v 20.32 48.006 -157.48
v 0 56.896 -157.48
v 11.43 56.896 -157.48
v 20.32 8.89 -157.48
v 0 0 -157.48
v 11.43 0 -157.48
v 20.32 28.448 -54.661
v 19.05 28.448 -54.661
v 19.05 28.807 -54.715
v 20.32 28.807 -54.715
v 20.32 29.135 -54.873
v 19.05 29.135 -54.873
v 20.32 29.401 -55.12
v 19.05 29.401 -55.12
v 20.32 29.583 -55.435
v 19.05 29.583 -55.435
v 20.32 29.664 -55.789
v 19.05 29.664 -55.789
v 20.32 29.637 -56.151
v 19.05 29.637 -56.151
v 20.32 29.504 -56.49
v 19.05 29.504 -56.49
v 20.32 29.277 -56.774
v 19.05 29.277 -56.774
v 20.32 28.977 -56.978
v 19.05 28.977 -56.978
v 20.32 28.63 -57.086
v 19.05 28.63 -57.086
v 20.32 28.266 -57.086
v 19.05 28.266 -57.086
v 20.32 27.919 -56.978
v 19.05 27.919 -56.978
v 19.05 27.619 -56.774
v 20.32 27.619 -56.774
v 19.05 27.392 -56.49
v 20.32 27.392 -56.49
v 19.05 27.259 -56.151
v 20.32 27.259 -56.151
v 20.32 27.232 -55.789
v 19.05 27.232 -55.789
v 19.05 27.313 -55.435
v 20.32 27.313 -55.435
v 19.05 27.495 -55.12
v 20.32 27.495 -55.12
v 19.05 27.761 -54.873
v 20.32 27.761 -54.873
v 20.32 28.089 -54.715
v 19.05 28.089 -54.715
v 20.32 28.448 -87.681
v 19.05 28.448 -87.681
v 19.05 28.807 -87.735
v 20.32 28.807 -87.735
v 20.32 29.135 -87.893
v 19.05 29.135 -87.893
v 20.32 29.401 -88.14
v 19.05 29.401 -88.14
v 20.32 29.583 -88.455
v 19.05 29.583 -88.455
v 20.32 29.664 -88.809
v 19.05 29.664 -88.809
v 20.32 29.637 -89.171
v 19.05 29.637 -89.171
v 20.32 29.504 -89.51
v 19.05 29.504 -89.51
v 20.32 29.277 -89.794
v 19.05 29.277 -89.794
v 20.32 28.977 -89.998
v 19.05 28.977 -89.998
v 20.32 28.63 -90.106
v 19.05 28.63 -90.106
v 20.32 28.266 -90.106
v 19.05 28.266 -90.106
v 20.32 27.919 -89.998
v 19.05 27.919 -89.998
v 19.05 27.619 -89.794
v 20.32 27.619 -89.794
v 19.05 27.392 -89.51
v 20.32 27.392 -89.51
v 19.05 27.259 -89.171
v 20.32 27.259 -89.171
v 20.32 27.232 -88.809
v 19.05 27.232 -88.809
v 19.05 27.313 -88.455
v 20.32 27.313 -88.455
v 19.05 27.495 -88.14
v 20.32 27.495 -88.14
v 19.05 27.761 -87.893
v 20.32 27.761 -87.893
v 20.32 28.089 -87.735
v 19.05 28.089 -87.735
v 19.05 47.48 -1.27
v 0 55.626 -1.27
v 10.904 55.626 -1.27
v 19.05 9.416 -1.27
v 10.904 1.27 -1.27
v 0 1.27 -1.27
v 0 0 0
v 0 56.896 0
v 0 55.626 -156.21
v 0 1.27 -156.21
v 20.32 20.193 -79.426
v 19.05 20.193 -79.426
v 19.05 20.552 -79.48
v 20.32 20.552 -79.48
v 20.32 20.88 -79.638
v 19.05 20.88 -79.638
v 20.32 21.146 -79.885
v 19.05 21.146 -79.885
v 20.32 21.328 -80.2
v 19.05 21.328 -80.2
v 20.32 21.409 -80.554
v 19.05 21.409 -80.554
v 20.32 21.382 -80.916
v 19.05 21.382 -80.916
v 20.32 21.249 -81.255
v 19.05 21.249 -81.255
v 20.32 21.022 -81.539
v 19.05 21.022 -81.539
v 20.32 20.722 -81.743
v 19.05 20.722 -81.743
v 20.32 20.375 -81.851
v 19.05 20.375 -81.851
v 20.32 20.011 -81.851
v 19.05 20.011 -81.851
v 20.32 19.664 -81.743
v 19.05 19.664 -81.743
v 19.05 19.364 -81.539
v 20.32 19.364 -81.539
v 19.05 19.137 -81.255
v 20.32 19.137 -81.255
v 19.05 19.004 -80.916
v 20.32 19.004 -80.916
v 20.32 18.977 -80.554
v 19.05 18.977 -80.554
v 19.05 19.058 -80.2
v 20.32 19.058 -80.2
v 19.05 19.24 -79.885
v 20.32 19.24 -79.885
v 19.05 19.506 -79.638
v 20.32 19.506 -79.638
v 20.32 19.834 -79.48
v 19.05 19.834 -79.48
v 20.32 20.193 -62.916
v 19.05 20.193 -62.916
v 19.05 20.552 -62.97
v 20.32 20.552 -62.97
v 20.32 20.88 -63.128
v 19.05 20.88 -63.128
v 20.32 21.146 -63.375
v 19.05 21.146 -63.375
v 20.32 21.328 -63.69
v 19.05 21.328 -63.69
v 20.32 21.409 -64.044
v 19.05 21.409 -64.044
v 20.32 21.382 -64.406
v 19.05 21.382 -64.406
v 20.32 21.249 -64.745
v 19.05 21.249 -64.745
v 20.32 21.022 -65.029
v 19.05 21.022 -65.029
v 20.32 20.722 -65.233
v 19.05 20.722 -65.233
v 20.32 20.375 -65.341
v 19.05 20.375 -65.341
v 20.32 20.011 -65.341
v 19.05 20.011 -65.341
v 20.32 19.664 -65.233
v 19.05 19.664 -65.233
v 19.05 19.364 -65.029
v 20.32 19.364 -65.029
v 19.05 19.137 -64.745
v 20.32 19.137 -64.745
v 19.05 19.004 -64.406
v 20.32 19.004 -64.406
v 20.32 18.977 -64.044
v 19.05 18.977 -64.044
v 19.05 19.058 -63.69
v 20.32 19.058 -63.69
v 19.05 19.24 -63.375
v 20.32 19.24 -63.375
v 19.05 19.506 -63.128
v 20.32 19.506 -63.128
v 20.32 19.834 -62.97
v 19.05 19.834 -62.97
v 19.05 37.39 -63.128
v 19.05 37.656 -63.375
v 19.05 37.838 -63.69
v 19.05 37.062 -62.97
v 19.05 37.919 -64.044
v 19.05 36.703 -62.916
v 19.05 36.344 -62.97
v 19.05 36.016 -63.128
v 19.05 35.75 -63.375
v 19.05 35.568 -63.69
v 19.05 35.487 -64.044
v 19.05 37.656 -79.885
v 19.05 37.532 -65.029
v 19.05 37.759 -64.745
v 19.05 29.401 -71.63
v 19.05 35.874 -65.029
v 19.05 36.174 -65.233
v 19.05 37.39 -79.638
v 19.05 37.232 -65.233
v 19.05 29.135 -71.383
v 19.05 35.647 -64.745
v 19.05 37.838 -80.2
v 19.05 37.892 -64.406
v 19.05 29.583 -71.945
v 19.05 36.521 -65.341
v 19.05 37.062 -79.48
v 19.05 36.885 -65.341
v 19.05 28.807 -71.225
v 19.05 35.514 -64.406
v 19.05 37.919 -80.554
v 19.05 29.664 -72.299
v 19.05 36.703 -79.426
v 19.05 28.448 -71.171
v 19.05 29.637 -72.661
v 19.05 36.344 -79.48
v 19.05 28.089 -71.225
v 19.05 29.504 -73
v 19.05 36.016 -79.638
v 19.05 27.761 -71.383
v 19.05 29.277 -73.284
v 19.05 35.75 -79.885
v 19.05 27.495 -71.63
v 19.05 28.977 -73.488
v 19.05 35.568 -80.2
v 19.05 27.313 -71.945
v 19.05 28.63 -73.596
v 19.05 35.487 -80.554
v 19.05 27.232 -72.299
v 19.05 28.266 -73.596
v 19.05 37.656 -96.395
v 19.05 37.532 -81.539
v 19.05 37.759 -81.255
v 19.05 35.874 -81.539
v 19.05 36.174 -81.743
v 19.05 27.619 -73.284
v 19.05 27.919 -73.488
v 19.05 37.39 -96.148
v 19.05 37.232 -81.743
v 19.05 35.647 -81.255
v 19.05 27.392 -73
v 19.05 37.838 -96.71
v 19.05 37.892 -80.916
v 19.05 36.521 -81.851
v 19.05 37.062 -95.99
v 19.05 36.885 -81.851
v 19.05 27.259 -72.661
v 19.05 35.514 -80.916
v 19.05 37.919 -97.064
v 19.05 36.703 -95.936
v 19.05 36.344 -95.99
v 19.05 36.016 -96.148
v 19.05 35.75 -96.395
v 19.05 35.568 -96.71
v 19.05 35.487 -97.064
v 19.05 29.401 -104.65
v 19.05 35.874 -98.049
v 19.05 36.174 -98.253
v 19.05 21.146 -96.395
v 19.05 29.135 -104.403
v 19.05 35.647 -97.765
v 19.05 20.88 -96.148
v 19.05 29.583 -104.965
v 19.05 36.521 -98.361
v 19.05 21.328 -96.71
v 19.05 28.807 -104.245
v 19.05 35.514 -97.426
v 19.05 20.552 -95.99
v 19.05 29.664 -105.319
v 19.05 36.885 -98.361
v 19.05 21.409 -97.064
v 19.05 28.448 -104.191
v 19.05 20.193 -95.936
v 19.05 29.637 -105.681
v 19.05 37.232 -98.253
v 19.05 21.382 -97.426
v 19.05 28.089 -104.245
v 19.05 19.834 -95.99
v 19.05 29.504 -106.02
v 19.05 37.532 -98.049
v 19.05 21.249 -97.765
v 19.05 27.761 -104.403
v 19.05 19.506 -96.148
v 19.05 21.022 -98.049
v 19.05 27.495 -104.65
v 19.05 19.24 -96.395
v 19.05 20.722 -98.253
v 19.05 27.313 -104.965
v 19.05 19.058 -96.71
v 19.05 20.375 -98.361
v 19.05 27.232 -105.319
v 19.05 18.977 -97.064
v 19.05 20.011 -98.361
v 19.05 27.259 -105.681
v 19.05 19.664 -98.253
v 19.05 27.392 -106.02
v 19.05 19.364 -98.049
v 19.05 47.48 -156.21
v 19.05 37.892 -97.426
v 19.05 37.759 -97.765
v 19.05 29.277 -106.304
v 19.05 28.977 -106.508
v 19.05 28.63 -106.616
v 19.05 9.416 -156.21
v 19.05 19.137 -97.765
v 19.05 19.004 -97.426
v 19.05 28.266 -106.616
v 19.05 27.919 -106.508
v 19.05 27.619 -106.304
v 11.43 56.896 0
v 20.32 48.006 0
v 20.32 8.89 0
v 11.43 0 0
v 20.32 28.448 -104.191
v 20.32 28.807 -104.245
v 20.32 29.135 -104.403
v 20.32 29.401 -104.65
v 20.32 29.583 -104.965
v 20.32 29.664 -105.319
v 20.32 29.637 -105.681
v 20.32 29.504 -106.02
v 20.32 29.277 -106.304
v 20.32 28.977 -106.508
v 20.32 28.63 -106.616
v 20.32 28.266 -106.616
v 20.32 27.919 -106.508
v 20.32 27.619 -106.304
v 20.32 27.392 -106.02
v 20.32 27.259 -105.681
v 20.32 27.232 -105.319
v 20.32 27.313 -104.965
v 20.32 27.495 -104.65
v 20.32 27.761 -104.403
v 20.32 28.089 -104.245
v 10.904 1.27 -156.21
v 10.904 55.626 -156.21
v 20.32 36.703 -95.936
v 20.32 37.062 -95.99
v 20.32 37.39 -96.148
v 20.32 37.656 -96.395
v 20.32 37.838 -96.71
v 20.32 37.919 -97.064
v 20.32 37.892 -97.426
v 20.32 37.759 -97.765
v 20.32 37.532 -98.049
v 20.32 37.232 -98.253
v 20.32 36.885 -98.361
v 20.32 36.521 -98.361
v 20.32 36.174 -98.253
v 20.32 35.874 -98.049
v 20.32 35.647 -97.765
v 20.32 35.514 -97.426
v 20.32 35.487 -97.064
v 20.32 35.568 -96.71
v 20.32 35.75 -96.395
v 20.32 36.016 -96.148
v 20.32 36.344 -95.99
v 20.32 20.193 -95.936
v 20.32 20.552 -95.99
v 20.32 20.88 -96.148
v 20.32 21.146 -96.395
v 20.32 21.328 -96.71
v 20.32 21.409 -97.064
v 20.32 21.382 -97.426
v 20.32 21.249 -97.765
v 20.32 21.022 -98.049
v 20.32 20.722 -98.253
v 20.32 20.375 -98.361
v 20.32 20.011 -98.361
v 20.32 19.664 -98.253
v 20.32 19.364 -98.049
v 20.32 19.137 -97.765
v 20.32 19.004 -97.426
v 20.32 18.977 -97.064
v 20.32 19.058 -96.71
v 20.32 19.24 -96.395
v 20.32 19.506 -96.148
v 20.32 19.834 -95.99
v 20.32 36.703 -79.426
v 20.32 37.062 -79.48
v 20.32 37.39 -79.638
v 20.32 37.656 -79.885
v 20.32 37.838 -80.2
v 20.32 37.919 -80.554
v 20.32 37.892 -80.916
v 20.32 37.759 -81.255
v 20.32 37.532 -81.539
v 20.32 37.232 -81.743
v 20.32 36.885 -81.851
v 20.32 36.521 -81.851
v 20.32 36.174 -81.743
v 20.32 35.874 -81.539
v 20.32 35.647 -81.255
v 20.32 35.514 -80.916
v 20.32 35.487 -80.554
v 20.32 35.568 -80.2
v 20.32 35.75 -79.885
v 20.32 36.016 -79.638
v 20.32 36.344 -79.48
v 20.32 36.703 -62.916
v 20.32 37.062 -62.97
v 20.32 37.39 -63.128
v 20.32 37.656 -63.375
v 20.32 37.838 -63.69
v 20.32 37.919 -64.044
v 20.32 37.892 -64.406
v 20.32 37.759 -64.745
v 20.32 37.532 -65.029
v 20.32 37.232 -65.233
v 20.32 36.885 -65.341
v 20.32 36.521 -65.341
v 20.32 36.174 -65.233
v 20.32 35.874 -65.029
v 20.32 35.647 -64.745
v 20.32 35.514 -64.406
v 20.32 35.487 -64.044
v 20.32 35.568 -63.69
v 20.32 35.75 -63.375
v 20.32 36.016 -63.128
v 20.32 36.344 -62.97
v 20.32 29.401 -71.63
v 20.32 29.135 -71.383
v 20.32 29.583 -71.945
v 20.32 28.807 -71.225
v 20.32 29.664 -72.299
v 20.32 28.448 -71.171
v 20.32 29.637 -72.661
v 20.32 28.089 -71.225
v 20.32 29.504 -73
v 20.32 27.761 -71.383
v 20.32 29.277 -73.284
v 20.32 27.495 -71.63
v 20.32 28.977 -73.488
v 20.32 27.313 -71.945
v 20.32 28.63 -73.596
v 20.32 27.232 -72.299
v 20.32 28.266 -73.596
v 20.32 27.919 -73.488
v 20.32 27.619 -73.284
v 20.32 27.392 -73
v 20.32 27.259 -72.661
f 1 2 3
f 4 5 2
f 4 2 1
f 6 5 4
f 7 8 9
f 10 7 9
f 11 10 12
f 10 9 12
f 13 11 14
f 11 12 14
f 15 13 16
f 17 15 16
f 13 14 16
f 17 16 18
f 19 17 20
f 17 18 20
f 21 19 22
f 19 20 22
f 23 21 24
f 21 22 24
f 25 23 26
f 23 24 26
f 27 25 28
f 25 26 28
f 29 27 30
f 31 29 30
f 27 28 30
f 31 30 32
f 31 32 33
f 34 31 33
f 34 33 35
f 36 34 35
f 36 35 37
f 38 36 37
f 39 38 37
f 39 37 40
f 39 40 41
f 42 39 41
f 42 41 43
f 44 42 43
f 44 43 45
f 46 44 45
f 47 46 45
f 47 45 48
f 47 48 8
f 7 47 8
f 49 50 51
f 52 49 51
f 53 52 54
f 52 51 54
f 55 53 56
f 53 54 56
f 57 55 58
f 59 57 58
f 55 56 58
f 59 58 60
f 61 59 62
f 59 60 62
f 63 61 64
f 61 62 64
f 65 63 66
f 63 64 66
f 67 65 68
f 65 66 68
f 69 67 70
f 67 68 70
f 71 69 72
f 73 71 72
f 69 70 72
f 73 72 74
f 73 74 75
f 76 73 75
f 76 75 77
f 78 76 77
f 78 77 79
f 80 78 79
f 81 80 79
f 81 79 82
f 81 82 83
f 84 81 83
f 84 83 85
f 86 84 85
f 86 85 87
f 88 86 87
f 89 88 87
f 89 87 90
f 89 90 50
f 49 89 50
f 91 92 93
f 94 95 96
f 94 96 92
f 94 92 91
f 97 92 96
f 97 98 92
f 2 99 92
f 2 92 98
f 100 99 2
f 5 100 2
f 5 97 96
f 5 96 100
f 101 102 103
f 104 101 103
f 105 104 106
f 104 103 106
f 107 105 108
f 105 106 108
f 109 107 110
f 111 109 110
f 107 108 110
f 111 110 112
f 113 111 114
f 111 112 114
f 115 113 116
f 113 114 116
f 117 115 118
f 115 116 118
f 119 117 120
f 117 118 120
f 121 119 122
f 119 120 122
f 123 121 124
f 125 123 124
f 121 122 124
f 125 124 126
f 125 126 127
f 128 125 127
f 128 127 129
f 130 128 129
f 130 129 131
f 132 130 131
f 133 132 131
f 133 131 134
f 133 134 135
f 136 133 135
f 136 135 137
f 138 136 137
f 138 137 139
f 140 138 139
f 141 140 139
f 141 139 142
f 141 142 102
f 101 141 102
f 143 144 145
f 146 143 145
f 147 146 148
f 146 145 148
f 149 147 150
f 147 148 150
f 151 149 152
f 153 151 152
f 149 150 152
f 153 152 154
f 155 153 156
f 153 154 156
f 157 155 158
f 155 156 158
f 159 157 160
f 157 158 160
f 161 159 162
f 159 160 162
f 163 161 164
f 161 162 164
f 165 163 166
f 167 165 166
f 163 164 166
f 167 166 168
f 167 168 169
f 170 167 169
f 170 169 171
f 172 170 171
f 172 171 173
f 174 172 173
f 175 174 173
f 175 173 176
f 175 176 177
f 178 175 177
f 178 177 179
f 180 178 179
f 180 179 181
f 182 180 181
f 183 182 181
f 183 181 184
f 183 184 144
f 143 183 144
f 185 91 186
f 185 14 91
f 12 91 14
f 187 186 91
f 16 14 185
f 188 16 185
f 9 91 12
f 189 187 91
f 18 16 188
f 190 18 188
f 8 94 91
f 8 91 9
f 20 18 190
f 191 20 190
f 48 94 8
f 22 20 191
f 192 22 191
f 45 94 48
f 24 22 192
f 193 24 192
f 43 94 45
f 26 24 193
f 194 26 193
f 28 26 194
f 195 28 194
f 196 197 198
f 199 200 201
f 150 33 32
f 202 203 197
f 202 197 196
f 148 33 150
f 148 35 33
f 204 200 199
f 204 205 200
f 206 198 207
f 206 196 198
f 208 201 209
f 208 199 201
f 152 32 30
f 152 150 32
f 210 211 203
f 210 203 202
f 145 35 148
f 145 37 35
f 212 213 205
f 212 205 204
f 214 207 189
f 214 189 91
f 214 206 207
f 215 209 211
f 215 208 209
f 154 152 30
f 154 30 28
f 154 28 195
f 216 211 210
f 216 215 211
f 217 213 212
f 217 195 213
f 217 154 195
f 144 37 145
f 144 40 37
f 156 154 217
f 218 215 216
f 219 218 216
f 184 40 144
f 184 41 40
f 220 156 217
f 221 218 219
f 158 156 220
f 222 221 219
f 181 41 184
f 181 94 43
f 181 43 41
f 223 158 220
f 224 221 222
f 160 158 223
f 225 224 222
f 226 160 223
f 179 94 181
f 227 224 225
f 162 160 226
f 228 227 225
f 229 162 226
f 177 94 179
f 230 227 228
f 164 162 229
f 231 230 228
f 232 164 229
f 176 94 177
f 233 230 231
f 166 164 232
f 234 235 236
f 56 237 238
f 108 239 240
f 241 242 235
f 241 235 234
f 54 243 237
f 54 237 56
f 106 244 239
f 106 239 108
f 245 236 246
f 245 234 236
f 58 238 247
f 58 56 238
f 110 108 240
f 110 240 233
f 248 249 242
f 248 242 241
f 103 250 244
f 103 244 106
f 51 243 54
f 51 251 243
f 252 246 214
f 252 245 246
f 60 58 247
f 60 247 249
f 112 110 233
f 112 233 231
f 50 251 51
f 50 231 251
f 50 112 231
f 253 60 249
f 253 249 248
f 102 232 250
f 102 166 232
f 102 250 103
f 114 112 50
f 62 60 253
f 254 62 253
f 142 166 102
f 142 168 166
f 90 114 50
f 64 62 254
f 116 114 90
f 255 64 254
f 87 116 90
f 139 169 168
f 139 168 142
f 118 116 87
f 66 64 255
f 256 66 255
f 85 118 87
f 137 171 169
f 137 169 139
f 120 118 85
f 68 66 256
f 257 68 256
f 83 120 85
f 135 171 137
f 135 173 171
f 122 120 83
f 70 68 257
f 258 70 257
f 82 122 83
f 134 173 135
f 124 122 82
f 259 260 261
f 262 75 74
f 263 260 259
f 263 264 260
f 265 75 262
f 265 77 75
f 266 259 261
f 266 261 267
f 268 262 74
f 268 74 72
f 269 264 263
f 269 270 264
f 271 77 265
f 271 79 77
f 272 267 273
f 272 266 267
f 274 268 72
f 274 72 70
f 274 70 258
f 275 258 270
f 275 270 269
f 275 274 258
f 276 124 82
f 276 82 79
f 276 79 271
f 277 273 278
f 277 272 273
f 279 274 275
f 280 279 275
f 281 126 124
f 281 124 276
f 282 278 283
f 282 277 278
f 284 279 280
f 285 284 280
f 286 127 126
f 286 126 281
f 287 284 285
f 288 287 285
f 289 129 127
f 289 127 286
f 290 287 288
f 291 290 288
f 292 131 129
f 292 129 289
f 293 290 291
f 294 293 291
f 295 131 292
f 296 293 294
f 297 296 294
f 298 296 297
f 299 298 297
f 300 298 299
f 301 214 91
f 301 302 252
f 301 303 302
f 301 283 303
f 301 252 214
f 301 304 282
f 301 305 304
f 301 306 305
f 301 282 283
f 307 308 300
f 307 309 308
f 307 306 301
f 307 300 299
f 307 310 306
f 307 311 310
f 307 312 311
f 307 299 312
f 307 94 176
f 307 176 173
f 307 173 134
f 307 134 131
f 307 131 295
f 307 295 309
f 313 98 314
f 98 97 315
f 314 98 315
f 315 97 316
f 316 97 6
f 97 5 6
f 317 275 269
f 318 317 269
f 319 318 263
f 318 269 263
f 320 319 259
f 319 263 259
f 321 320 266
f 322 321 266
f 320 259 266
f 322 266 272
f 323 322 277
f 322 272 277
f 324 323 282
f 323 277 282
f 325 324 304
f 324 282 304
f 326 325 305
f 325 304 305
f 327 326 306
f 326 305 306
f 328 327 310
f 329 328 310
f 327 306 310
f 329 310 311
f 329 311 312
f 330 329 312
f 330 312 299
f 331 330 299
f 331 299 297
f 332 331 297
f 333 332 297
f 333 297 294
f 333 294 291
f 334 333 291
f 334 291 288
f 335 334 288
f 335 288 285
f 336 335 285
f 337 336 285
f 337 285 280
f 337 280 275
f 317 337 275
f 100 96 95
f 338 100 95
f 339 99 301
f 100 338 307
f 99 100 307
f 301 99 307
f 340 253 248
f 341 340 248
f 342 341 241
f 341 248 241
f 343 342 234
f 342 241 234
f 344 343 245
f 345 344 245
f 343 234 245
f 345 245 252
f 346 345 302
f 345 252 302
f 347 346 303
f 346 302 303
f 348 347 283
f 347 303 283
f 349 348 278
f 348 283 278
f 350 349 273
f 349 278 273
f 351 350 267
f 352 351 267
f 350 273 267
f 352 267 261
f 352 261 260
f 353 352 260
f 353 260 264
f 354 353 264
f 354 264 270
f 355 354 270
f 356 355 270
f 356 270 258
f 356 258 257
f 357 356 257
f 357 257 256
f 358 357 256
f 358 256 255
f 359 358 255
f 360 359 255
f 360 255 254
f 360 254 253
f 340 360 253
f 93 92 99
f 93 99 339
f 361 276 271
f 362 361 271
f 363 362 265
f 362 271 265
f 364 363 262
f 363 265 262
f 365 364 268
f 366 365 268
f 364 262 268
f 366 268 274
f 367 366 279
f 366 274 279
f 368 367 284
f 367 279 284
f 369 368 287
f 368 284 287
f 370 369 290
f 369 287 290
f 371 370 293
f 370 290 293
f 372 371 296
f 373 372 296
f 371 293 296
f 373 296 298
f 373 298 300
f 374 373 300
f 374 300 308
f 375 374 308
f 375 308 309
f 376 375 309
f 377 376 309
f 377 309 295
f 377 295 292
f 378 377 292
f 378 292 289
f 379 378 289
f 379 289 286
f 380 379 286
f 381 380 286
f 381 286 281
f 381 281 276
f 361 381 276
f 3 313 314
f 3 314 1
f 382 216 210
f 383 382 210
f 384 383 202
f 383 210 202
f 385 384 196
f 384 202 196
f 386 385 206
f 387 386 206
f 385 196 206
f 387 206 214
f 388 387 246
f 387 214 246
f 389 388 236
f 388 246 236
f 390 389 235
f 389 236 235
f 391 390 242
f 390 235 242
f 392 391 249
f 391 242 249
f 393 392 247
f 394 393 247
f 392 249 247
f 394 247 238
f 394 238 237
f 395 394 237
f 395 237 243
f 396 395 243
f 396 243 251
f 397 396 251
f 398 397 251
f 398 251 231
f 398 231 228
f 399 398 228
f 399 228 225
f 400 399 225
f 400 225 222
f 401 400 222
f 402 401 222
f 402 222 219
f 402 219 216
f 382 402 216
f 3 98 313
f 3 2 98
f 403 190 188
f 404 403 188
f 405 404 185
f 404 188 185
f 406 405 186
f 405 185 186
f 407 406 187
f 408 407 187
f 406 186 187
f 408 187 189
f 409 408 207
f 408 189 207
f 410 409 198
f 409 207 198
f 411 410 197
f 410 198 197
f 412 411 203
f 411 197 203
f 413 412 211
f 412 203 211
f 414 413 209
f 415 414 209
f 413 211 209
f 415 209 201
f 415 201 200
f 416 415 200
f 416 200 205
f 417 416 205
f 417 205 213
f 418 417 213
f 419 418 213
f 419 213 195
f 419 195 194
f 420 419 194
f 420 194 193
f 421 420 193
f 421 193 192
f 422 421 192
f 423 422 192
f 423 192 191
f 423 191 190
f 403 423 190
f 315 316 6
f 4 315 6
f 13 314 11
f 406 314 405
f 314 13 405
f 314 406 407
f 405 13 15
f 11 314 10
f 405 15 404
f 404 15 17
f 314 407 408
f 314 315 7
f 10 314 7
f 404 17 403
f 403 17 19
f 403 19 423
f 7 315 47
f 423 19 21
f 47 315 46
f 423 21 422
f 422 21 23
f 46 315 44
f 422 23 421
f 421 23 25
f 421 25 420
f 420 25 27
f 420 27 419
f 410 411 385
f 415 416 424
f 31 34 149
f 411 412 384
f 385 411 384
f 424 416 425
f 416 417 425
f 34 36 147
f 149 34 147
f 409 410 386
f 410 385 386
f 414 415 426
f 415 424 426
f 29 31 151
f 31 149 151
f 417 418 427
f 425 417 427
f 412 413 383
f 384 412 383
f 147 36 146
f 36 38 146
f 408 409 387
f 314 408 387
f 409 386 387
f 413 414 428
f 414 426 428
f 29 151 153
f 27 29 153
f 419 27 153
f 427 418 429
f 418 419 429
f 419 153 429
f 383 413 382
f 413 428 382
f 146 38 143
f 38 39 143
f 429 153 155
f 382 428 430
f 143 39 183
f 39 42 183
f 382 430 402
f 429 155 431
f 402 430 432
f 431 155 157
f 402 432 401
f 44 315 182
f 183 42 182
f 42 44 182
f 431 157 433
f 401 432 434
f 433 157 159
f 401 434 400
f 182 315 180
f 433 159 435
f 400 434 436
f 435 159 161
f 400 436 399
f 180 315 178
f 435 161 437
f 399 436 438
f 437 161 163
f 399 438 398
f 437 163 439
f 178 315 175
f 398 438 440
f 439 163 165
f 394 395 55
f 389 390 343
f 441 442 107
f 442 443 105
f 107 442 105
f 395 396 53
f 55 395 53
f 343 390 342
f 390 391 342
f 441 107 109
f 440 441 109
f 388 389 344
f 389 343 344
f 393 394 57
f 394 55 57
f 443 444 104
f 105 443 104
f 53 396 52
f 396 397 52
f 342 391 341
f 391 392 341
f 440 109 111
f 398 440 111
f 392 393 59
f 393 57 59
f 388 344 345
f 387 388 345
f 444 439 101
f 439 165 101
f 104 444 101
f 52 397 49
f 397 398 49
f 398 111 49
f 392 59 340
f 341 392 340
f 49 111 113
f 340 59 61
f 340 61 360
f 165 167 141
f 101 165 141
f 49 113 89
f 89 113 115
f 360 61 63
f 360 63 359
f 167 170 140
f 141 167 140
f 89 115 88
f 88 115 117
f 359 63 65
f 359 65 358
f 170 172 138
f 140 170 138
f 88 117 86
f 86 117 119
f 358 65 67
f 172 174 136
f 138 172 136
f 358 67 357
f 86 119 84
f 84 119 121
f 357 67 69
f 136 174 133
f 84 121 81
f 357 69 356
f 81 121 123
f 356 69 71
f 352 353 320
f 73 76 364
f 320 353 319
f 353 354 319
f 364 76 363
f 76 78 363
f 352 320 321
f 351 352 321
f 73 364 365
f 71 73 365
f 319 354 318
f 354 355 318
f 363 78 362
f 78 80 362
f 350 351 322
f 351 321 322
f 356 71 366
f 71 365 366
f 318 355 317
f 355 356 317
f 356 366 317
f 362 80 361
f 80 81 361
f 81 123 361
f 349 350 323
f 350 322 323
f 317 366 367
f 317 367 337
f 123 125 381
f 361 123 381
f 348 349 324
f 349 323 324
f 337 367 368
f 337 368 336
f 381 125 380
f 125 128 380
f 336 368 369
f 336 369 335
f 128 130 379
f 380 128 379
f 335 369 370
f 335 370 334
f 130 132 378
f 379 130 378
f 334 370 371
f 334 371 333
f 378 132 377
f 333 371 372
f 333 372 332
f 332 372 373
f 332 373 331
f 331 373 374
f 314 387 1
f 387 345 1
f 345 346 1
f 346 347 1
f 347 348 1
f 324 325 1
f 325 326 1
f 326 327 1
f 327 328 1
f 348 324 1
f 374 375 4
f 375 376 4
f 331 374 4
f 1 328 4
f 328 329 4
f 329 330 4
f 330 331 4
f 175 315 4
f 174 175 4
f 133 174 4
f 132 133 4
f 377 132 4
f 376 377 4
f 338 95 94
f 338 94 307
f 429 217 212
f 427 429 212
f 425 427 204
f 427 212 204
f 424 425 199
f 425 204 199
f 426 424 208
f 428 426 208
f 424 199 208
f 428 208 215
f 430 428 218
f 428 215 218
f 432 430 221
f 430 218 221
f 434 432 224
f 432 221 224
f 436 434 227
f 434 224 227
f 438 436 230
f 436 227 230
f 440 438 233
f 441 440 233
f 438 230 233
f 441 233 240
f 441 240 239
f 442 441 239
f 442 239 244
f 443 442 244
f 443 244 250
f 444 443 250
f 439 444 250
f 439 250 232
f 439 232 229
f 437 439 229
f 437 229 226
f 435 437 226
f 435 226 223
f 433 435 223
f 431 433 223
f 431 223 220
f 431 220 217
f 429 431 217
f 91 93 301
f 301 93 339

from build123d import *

# Parameters (mm, degrees)
SKETCH1_W                 = 20.32
SKETCH1_H                 = 157.48
BOSS_EXTRUDE1_DEPTH       = 56.896
CHAMFER1_SIZE             = 8.89
SHELL1_T                  = -1.27
F_2_CLEARANCE_HOLE1_D     = 2.4384
F_2_CLEARANCE_HOLE1_DEPTH = 7.62
F_2_CLEARANCE_HOLE1_TIP   = 0.732569267


with BuildPart() as part:
    # Sketch1 → Boss-Extrude1 (new body)
    with BuildSketch(Plane(origin=(0, 0, 0), x_dir=(1, 0, 0), z_dir=(0, 1, 0))):
        with Locations((10.16, 78.74)):
            Rectangle(SKETCH1_W, SKETCH1_H)
    extrude(amount=BOSS_EXTRUDE1_DEPTH)

    # Chamfer1
    chamfer1_edges = [part.edges().sort_by_distance(p)[0] for p in [
        (20.32, 56.896, -78.74),
        (20.32, 0, -78.74),
    ]]
    chamfer(chamfer1_edges, length=CHAMFER1_SIZE)

    # Shell1
    shell1_openings = [part.faces().sort_by_distance(p)[0] for p in [
        (0, 28.448, -78.74),
    ]]
    offset(amount=SHELL1_T, openings=shell1_openings, kind=Kind.INTERSECTION)

    # #2 Clearance Hole1
    with Locations(Plane(origin=(20.32, 0, 0), x_dir=(0, 0, -1), z_dir=(1, 0, 0))):
        with Locations((55.88, 28.448), (72.39, 28.448), (80.645, 36.703), (80.645, 20.193), (88.9, 28.448), (105.41, 28.448), (97.155, 36.703), (97.155, 20.193), (64.135, 36.703), (64.135, 20.193)):
            Hole(F_2_CLEARANCE_HOLE1_D / 2, depth=F_2_CLEARANCE_HOLE1_DEPTH)
            with Locations((0, 0, -(F_2_CLEARANCE_HOLE1_DEPTH + F_2_CLEARANCE_HOLE1_TIP / 2))):  # 118° drill point
                Cone(0, F_2_CLEARANCE_HOLE1_D / 2, F_2_CLEARANCE_HOLE1_TIP, mode=Mode.SUBTRACT)


solid = part.part
